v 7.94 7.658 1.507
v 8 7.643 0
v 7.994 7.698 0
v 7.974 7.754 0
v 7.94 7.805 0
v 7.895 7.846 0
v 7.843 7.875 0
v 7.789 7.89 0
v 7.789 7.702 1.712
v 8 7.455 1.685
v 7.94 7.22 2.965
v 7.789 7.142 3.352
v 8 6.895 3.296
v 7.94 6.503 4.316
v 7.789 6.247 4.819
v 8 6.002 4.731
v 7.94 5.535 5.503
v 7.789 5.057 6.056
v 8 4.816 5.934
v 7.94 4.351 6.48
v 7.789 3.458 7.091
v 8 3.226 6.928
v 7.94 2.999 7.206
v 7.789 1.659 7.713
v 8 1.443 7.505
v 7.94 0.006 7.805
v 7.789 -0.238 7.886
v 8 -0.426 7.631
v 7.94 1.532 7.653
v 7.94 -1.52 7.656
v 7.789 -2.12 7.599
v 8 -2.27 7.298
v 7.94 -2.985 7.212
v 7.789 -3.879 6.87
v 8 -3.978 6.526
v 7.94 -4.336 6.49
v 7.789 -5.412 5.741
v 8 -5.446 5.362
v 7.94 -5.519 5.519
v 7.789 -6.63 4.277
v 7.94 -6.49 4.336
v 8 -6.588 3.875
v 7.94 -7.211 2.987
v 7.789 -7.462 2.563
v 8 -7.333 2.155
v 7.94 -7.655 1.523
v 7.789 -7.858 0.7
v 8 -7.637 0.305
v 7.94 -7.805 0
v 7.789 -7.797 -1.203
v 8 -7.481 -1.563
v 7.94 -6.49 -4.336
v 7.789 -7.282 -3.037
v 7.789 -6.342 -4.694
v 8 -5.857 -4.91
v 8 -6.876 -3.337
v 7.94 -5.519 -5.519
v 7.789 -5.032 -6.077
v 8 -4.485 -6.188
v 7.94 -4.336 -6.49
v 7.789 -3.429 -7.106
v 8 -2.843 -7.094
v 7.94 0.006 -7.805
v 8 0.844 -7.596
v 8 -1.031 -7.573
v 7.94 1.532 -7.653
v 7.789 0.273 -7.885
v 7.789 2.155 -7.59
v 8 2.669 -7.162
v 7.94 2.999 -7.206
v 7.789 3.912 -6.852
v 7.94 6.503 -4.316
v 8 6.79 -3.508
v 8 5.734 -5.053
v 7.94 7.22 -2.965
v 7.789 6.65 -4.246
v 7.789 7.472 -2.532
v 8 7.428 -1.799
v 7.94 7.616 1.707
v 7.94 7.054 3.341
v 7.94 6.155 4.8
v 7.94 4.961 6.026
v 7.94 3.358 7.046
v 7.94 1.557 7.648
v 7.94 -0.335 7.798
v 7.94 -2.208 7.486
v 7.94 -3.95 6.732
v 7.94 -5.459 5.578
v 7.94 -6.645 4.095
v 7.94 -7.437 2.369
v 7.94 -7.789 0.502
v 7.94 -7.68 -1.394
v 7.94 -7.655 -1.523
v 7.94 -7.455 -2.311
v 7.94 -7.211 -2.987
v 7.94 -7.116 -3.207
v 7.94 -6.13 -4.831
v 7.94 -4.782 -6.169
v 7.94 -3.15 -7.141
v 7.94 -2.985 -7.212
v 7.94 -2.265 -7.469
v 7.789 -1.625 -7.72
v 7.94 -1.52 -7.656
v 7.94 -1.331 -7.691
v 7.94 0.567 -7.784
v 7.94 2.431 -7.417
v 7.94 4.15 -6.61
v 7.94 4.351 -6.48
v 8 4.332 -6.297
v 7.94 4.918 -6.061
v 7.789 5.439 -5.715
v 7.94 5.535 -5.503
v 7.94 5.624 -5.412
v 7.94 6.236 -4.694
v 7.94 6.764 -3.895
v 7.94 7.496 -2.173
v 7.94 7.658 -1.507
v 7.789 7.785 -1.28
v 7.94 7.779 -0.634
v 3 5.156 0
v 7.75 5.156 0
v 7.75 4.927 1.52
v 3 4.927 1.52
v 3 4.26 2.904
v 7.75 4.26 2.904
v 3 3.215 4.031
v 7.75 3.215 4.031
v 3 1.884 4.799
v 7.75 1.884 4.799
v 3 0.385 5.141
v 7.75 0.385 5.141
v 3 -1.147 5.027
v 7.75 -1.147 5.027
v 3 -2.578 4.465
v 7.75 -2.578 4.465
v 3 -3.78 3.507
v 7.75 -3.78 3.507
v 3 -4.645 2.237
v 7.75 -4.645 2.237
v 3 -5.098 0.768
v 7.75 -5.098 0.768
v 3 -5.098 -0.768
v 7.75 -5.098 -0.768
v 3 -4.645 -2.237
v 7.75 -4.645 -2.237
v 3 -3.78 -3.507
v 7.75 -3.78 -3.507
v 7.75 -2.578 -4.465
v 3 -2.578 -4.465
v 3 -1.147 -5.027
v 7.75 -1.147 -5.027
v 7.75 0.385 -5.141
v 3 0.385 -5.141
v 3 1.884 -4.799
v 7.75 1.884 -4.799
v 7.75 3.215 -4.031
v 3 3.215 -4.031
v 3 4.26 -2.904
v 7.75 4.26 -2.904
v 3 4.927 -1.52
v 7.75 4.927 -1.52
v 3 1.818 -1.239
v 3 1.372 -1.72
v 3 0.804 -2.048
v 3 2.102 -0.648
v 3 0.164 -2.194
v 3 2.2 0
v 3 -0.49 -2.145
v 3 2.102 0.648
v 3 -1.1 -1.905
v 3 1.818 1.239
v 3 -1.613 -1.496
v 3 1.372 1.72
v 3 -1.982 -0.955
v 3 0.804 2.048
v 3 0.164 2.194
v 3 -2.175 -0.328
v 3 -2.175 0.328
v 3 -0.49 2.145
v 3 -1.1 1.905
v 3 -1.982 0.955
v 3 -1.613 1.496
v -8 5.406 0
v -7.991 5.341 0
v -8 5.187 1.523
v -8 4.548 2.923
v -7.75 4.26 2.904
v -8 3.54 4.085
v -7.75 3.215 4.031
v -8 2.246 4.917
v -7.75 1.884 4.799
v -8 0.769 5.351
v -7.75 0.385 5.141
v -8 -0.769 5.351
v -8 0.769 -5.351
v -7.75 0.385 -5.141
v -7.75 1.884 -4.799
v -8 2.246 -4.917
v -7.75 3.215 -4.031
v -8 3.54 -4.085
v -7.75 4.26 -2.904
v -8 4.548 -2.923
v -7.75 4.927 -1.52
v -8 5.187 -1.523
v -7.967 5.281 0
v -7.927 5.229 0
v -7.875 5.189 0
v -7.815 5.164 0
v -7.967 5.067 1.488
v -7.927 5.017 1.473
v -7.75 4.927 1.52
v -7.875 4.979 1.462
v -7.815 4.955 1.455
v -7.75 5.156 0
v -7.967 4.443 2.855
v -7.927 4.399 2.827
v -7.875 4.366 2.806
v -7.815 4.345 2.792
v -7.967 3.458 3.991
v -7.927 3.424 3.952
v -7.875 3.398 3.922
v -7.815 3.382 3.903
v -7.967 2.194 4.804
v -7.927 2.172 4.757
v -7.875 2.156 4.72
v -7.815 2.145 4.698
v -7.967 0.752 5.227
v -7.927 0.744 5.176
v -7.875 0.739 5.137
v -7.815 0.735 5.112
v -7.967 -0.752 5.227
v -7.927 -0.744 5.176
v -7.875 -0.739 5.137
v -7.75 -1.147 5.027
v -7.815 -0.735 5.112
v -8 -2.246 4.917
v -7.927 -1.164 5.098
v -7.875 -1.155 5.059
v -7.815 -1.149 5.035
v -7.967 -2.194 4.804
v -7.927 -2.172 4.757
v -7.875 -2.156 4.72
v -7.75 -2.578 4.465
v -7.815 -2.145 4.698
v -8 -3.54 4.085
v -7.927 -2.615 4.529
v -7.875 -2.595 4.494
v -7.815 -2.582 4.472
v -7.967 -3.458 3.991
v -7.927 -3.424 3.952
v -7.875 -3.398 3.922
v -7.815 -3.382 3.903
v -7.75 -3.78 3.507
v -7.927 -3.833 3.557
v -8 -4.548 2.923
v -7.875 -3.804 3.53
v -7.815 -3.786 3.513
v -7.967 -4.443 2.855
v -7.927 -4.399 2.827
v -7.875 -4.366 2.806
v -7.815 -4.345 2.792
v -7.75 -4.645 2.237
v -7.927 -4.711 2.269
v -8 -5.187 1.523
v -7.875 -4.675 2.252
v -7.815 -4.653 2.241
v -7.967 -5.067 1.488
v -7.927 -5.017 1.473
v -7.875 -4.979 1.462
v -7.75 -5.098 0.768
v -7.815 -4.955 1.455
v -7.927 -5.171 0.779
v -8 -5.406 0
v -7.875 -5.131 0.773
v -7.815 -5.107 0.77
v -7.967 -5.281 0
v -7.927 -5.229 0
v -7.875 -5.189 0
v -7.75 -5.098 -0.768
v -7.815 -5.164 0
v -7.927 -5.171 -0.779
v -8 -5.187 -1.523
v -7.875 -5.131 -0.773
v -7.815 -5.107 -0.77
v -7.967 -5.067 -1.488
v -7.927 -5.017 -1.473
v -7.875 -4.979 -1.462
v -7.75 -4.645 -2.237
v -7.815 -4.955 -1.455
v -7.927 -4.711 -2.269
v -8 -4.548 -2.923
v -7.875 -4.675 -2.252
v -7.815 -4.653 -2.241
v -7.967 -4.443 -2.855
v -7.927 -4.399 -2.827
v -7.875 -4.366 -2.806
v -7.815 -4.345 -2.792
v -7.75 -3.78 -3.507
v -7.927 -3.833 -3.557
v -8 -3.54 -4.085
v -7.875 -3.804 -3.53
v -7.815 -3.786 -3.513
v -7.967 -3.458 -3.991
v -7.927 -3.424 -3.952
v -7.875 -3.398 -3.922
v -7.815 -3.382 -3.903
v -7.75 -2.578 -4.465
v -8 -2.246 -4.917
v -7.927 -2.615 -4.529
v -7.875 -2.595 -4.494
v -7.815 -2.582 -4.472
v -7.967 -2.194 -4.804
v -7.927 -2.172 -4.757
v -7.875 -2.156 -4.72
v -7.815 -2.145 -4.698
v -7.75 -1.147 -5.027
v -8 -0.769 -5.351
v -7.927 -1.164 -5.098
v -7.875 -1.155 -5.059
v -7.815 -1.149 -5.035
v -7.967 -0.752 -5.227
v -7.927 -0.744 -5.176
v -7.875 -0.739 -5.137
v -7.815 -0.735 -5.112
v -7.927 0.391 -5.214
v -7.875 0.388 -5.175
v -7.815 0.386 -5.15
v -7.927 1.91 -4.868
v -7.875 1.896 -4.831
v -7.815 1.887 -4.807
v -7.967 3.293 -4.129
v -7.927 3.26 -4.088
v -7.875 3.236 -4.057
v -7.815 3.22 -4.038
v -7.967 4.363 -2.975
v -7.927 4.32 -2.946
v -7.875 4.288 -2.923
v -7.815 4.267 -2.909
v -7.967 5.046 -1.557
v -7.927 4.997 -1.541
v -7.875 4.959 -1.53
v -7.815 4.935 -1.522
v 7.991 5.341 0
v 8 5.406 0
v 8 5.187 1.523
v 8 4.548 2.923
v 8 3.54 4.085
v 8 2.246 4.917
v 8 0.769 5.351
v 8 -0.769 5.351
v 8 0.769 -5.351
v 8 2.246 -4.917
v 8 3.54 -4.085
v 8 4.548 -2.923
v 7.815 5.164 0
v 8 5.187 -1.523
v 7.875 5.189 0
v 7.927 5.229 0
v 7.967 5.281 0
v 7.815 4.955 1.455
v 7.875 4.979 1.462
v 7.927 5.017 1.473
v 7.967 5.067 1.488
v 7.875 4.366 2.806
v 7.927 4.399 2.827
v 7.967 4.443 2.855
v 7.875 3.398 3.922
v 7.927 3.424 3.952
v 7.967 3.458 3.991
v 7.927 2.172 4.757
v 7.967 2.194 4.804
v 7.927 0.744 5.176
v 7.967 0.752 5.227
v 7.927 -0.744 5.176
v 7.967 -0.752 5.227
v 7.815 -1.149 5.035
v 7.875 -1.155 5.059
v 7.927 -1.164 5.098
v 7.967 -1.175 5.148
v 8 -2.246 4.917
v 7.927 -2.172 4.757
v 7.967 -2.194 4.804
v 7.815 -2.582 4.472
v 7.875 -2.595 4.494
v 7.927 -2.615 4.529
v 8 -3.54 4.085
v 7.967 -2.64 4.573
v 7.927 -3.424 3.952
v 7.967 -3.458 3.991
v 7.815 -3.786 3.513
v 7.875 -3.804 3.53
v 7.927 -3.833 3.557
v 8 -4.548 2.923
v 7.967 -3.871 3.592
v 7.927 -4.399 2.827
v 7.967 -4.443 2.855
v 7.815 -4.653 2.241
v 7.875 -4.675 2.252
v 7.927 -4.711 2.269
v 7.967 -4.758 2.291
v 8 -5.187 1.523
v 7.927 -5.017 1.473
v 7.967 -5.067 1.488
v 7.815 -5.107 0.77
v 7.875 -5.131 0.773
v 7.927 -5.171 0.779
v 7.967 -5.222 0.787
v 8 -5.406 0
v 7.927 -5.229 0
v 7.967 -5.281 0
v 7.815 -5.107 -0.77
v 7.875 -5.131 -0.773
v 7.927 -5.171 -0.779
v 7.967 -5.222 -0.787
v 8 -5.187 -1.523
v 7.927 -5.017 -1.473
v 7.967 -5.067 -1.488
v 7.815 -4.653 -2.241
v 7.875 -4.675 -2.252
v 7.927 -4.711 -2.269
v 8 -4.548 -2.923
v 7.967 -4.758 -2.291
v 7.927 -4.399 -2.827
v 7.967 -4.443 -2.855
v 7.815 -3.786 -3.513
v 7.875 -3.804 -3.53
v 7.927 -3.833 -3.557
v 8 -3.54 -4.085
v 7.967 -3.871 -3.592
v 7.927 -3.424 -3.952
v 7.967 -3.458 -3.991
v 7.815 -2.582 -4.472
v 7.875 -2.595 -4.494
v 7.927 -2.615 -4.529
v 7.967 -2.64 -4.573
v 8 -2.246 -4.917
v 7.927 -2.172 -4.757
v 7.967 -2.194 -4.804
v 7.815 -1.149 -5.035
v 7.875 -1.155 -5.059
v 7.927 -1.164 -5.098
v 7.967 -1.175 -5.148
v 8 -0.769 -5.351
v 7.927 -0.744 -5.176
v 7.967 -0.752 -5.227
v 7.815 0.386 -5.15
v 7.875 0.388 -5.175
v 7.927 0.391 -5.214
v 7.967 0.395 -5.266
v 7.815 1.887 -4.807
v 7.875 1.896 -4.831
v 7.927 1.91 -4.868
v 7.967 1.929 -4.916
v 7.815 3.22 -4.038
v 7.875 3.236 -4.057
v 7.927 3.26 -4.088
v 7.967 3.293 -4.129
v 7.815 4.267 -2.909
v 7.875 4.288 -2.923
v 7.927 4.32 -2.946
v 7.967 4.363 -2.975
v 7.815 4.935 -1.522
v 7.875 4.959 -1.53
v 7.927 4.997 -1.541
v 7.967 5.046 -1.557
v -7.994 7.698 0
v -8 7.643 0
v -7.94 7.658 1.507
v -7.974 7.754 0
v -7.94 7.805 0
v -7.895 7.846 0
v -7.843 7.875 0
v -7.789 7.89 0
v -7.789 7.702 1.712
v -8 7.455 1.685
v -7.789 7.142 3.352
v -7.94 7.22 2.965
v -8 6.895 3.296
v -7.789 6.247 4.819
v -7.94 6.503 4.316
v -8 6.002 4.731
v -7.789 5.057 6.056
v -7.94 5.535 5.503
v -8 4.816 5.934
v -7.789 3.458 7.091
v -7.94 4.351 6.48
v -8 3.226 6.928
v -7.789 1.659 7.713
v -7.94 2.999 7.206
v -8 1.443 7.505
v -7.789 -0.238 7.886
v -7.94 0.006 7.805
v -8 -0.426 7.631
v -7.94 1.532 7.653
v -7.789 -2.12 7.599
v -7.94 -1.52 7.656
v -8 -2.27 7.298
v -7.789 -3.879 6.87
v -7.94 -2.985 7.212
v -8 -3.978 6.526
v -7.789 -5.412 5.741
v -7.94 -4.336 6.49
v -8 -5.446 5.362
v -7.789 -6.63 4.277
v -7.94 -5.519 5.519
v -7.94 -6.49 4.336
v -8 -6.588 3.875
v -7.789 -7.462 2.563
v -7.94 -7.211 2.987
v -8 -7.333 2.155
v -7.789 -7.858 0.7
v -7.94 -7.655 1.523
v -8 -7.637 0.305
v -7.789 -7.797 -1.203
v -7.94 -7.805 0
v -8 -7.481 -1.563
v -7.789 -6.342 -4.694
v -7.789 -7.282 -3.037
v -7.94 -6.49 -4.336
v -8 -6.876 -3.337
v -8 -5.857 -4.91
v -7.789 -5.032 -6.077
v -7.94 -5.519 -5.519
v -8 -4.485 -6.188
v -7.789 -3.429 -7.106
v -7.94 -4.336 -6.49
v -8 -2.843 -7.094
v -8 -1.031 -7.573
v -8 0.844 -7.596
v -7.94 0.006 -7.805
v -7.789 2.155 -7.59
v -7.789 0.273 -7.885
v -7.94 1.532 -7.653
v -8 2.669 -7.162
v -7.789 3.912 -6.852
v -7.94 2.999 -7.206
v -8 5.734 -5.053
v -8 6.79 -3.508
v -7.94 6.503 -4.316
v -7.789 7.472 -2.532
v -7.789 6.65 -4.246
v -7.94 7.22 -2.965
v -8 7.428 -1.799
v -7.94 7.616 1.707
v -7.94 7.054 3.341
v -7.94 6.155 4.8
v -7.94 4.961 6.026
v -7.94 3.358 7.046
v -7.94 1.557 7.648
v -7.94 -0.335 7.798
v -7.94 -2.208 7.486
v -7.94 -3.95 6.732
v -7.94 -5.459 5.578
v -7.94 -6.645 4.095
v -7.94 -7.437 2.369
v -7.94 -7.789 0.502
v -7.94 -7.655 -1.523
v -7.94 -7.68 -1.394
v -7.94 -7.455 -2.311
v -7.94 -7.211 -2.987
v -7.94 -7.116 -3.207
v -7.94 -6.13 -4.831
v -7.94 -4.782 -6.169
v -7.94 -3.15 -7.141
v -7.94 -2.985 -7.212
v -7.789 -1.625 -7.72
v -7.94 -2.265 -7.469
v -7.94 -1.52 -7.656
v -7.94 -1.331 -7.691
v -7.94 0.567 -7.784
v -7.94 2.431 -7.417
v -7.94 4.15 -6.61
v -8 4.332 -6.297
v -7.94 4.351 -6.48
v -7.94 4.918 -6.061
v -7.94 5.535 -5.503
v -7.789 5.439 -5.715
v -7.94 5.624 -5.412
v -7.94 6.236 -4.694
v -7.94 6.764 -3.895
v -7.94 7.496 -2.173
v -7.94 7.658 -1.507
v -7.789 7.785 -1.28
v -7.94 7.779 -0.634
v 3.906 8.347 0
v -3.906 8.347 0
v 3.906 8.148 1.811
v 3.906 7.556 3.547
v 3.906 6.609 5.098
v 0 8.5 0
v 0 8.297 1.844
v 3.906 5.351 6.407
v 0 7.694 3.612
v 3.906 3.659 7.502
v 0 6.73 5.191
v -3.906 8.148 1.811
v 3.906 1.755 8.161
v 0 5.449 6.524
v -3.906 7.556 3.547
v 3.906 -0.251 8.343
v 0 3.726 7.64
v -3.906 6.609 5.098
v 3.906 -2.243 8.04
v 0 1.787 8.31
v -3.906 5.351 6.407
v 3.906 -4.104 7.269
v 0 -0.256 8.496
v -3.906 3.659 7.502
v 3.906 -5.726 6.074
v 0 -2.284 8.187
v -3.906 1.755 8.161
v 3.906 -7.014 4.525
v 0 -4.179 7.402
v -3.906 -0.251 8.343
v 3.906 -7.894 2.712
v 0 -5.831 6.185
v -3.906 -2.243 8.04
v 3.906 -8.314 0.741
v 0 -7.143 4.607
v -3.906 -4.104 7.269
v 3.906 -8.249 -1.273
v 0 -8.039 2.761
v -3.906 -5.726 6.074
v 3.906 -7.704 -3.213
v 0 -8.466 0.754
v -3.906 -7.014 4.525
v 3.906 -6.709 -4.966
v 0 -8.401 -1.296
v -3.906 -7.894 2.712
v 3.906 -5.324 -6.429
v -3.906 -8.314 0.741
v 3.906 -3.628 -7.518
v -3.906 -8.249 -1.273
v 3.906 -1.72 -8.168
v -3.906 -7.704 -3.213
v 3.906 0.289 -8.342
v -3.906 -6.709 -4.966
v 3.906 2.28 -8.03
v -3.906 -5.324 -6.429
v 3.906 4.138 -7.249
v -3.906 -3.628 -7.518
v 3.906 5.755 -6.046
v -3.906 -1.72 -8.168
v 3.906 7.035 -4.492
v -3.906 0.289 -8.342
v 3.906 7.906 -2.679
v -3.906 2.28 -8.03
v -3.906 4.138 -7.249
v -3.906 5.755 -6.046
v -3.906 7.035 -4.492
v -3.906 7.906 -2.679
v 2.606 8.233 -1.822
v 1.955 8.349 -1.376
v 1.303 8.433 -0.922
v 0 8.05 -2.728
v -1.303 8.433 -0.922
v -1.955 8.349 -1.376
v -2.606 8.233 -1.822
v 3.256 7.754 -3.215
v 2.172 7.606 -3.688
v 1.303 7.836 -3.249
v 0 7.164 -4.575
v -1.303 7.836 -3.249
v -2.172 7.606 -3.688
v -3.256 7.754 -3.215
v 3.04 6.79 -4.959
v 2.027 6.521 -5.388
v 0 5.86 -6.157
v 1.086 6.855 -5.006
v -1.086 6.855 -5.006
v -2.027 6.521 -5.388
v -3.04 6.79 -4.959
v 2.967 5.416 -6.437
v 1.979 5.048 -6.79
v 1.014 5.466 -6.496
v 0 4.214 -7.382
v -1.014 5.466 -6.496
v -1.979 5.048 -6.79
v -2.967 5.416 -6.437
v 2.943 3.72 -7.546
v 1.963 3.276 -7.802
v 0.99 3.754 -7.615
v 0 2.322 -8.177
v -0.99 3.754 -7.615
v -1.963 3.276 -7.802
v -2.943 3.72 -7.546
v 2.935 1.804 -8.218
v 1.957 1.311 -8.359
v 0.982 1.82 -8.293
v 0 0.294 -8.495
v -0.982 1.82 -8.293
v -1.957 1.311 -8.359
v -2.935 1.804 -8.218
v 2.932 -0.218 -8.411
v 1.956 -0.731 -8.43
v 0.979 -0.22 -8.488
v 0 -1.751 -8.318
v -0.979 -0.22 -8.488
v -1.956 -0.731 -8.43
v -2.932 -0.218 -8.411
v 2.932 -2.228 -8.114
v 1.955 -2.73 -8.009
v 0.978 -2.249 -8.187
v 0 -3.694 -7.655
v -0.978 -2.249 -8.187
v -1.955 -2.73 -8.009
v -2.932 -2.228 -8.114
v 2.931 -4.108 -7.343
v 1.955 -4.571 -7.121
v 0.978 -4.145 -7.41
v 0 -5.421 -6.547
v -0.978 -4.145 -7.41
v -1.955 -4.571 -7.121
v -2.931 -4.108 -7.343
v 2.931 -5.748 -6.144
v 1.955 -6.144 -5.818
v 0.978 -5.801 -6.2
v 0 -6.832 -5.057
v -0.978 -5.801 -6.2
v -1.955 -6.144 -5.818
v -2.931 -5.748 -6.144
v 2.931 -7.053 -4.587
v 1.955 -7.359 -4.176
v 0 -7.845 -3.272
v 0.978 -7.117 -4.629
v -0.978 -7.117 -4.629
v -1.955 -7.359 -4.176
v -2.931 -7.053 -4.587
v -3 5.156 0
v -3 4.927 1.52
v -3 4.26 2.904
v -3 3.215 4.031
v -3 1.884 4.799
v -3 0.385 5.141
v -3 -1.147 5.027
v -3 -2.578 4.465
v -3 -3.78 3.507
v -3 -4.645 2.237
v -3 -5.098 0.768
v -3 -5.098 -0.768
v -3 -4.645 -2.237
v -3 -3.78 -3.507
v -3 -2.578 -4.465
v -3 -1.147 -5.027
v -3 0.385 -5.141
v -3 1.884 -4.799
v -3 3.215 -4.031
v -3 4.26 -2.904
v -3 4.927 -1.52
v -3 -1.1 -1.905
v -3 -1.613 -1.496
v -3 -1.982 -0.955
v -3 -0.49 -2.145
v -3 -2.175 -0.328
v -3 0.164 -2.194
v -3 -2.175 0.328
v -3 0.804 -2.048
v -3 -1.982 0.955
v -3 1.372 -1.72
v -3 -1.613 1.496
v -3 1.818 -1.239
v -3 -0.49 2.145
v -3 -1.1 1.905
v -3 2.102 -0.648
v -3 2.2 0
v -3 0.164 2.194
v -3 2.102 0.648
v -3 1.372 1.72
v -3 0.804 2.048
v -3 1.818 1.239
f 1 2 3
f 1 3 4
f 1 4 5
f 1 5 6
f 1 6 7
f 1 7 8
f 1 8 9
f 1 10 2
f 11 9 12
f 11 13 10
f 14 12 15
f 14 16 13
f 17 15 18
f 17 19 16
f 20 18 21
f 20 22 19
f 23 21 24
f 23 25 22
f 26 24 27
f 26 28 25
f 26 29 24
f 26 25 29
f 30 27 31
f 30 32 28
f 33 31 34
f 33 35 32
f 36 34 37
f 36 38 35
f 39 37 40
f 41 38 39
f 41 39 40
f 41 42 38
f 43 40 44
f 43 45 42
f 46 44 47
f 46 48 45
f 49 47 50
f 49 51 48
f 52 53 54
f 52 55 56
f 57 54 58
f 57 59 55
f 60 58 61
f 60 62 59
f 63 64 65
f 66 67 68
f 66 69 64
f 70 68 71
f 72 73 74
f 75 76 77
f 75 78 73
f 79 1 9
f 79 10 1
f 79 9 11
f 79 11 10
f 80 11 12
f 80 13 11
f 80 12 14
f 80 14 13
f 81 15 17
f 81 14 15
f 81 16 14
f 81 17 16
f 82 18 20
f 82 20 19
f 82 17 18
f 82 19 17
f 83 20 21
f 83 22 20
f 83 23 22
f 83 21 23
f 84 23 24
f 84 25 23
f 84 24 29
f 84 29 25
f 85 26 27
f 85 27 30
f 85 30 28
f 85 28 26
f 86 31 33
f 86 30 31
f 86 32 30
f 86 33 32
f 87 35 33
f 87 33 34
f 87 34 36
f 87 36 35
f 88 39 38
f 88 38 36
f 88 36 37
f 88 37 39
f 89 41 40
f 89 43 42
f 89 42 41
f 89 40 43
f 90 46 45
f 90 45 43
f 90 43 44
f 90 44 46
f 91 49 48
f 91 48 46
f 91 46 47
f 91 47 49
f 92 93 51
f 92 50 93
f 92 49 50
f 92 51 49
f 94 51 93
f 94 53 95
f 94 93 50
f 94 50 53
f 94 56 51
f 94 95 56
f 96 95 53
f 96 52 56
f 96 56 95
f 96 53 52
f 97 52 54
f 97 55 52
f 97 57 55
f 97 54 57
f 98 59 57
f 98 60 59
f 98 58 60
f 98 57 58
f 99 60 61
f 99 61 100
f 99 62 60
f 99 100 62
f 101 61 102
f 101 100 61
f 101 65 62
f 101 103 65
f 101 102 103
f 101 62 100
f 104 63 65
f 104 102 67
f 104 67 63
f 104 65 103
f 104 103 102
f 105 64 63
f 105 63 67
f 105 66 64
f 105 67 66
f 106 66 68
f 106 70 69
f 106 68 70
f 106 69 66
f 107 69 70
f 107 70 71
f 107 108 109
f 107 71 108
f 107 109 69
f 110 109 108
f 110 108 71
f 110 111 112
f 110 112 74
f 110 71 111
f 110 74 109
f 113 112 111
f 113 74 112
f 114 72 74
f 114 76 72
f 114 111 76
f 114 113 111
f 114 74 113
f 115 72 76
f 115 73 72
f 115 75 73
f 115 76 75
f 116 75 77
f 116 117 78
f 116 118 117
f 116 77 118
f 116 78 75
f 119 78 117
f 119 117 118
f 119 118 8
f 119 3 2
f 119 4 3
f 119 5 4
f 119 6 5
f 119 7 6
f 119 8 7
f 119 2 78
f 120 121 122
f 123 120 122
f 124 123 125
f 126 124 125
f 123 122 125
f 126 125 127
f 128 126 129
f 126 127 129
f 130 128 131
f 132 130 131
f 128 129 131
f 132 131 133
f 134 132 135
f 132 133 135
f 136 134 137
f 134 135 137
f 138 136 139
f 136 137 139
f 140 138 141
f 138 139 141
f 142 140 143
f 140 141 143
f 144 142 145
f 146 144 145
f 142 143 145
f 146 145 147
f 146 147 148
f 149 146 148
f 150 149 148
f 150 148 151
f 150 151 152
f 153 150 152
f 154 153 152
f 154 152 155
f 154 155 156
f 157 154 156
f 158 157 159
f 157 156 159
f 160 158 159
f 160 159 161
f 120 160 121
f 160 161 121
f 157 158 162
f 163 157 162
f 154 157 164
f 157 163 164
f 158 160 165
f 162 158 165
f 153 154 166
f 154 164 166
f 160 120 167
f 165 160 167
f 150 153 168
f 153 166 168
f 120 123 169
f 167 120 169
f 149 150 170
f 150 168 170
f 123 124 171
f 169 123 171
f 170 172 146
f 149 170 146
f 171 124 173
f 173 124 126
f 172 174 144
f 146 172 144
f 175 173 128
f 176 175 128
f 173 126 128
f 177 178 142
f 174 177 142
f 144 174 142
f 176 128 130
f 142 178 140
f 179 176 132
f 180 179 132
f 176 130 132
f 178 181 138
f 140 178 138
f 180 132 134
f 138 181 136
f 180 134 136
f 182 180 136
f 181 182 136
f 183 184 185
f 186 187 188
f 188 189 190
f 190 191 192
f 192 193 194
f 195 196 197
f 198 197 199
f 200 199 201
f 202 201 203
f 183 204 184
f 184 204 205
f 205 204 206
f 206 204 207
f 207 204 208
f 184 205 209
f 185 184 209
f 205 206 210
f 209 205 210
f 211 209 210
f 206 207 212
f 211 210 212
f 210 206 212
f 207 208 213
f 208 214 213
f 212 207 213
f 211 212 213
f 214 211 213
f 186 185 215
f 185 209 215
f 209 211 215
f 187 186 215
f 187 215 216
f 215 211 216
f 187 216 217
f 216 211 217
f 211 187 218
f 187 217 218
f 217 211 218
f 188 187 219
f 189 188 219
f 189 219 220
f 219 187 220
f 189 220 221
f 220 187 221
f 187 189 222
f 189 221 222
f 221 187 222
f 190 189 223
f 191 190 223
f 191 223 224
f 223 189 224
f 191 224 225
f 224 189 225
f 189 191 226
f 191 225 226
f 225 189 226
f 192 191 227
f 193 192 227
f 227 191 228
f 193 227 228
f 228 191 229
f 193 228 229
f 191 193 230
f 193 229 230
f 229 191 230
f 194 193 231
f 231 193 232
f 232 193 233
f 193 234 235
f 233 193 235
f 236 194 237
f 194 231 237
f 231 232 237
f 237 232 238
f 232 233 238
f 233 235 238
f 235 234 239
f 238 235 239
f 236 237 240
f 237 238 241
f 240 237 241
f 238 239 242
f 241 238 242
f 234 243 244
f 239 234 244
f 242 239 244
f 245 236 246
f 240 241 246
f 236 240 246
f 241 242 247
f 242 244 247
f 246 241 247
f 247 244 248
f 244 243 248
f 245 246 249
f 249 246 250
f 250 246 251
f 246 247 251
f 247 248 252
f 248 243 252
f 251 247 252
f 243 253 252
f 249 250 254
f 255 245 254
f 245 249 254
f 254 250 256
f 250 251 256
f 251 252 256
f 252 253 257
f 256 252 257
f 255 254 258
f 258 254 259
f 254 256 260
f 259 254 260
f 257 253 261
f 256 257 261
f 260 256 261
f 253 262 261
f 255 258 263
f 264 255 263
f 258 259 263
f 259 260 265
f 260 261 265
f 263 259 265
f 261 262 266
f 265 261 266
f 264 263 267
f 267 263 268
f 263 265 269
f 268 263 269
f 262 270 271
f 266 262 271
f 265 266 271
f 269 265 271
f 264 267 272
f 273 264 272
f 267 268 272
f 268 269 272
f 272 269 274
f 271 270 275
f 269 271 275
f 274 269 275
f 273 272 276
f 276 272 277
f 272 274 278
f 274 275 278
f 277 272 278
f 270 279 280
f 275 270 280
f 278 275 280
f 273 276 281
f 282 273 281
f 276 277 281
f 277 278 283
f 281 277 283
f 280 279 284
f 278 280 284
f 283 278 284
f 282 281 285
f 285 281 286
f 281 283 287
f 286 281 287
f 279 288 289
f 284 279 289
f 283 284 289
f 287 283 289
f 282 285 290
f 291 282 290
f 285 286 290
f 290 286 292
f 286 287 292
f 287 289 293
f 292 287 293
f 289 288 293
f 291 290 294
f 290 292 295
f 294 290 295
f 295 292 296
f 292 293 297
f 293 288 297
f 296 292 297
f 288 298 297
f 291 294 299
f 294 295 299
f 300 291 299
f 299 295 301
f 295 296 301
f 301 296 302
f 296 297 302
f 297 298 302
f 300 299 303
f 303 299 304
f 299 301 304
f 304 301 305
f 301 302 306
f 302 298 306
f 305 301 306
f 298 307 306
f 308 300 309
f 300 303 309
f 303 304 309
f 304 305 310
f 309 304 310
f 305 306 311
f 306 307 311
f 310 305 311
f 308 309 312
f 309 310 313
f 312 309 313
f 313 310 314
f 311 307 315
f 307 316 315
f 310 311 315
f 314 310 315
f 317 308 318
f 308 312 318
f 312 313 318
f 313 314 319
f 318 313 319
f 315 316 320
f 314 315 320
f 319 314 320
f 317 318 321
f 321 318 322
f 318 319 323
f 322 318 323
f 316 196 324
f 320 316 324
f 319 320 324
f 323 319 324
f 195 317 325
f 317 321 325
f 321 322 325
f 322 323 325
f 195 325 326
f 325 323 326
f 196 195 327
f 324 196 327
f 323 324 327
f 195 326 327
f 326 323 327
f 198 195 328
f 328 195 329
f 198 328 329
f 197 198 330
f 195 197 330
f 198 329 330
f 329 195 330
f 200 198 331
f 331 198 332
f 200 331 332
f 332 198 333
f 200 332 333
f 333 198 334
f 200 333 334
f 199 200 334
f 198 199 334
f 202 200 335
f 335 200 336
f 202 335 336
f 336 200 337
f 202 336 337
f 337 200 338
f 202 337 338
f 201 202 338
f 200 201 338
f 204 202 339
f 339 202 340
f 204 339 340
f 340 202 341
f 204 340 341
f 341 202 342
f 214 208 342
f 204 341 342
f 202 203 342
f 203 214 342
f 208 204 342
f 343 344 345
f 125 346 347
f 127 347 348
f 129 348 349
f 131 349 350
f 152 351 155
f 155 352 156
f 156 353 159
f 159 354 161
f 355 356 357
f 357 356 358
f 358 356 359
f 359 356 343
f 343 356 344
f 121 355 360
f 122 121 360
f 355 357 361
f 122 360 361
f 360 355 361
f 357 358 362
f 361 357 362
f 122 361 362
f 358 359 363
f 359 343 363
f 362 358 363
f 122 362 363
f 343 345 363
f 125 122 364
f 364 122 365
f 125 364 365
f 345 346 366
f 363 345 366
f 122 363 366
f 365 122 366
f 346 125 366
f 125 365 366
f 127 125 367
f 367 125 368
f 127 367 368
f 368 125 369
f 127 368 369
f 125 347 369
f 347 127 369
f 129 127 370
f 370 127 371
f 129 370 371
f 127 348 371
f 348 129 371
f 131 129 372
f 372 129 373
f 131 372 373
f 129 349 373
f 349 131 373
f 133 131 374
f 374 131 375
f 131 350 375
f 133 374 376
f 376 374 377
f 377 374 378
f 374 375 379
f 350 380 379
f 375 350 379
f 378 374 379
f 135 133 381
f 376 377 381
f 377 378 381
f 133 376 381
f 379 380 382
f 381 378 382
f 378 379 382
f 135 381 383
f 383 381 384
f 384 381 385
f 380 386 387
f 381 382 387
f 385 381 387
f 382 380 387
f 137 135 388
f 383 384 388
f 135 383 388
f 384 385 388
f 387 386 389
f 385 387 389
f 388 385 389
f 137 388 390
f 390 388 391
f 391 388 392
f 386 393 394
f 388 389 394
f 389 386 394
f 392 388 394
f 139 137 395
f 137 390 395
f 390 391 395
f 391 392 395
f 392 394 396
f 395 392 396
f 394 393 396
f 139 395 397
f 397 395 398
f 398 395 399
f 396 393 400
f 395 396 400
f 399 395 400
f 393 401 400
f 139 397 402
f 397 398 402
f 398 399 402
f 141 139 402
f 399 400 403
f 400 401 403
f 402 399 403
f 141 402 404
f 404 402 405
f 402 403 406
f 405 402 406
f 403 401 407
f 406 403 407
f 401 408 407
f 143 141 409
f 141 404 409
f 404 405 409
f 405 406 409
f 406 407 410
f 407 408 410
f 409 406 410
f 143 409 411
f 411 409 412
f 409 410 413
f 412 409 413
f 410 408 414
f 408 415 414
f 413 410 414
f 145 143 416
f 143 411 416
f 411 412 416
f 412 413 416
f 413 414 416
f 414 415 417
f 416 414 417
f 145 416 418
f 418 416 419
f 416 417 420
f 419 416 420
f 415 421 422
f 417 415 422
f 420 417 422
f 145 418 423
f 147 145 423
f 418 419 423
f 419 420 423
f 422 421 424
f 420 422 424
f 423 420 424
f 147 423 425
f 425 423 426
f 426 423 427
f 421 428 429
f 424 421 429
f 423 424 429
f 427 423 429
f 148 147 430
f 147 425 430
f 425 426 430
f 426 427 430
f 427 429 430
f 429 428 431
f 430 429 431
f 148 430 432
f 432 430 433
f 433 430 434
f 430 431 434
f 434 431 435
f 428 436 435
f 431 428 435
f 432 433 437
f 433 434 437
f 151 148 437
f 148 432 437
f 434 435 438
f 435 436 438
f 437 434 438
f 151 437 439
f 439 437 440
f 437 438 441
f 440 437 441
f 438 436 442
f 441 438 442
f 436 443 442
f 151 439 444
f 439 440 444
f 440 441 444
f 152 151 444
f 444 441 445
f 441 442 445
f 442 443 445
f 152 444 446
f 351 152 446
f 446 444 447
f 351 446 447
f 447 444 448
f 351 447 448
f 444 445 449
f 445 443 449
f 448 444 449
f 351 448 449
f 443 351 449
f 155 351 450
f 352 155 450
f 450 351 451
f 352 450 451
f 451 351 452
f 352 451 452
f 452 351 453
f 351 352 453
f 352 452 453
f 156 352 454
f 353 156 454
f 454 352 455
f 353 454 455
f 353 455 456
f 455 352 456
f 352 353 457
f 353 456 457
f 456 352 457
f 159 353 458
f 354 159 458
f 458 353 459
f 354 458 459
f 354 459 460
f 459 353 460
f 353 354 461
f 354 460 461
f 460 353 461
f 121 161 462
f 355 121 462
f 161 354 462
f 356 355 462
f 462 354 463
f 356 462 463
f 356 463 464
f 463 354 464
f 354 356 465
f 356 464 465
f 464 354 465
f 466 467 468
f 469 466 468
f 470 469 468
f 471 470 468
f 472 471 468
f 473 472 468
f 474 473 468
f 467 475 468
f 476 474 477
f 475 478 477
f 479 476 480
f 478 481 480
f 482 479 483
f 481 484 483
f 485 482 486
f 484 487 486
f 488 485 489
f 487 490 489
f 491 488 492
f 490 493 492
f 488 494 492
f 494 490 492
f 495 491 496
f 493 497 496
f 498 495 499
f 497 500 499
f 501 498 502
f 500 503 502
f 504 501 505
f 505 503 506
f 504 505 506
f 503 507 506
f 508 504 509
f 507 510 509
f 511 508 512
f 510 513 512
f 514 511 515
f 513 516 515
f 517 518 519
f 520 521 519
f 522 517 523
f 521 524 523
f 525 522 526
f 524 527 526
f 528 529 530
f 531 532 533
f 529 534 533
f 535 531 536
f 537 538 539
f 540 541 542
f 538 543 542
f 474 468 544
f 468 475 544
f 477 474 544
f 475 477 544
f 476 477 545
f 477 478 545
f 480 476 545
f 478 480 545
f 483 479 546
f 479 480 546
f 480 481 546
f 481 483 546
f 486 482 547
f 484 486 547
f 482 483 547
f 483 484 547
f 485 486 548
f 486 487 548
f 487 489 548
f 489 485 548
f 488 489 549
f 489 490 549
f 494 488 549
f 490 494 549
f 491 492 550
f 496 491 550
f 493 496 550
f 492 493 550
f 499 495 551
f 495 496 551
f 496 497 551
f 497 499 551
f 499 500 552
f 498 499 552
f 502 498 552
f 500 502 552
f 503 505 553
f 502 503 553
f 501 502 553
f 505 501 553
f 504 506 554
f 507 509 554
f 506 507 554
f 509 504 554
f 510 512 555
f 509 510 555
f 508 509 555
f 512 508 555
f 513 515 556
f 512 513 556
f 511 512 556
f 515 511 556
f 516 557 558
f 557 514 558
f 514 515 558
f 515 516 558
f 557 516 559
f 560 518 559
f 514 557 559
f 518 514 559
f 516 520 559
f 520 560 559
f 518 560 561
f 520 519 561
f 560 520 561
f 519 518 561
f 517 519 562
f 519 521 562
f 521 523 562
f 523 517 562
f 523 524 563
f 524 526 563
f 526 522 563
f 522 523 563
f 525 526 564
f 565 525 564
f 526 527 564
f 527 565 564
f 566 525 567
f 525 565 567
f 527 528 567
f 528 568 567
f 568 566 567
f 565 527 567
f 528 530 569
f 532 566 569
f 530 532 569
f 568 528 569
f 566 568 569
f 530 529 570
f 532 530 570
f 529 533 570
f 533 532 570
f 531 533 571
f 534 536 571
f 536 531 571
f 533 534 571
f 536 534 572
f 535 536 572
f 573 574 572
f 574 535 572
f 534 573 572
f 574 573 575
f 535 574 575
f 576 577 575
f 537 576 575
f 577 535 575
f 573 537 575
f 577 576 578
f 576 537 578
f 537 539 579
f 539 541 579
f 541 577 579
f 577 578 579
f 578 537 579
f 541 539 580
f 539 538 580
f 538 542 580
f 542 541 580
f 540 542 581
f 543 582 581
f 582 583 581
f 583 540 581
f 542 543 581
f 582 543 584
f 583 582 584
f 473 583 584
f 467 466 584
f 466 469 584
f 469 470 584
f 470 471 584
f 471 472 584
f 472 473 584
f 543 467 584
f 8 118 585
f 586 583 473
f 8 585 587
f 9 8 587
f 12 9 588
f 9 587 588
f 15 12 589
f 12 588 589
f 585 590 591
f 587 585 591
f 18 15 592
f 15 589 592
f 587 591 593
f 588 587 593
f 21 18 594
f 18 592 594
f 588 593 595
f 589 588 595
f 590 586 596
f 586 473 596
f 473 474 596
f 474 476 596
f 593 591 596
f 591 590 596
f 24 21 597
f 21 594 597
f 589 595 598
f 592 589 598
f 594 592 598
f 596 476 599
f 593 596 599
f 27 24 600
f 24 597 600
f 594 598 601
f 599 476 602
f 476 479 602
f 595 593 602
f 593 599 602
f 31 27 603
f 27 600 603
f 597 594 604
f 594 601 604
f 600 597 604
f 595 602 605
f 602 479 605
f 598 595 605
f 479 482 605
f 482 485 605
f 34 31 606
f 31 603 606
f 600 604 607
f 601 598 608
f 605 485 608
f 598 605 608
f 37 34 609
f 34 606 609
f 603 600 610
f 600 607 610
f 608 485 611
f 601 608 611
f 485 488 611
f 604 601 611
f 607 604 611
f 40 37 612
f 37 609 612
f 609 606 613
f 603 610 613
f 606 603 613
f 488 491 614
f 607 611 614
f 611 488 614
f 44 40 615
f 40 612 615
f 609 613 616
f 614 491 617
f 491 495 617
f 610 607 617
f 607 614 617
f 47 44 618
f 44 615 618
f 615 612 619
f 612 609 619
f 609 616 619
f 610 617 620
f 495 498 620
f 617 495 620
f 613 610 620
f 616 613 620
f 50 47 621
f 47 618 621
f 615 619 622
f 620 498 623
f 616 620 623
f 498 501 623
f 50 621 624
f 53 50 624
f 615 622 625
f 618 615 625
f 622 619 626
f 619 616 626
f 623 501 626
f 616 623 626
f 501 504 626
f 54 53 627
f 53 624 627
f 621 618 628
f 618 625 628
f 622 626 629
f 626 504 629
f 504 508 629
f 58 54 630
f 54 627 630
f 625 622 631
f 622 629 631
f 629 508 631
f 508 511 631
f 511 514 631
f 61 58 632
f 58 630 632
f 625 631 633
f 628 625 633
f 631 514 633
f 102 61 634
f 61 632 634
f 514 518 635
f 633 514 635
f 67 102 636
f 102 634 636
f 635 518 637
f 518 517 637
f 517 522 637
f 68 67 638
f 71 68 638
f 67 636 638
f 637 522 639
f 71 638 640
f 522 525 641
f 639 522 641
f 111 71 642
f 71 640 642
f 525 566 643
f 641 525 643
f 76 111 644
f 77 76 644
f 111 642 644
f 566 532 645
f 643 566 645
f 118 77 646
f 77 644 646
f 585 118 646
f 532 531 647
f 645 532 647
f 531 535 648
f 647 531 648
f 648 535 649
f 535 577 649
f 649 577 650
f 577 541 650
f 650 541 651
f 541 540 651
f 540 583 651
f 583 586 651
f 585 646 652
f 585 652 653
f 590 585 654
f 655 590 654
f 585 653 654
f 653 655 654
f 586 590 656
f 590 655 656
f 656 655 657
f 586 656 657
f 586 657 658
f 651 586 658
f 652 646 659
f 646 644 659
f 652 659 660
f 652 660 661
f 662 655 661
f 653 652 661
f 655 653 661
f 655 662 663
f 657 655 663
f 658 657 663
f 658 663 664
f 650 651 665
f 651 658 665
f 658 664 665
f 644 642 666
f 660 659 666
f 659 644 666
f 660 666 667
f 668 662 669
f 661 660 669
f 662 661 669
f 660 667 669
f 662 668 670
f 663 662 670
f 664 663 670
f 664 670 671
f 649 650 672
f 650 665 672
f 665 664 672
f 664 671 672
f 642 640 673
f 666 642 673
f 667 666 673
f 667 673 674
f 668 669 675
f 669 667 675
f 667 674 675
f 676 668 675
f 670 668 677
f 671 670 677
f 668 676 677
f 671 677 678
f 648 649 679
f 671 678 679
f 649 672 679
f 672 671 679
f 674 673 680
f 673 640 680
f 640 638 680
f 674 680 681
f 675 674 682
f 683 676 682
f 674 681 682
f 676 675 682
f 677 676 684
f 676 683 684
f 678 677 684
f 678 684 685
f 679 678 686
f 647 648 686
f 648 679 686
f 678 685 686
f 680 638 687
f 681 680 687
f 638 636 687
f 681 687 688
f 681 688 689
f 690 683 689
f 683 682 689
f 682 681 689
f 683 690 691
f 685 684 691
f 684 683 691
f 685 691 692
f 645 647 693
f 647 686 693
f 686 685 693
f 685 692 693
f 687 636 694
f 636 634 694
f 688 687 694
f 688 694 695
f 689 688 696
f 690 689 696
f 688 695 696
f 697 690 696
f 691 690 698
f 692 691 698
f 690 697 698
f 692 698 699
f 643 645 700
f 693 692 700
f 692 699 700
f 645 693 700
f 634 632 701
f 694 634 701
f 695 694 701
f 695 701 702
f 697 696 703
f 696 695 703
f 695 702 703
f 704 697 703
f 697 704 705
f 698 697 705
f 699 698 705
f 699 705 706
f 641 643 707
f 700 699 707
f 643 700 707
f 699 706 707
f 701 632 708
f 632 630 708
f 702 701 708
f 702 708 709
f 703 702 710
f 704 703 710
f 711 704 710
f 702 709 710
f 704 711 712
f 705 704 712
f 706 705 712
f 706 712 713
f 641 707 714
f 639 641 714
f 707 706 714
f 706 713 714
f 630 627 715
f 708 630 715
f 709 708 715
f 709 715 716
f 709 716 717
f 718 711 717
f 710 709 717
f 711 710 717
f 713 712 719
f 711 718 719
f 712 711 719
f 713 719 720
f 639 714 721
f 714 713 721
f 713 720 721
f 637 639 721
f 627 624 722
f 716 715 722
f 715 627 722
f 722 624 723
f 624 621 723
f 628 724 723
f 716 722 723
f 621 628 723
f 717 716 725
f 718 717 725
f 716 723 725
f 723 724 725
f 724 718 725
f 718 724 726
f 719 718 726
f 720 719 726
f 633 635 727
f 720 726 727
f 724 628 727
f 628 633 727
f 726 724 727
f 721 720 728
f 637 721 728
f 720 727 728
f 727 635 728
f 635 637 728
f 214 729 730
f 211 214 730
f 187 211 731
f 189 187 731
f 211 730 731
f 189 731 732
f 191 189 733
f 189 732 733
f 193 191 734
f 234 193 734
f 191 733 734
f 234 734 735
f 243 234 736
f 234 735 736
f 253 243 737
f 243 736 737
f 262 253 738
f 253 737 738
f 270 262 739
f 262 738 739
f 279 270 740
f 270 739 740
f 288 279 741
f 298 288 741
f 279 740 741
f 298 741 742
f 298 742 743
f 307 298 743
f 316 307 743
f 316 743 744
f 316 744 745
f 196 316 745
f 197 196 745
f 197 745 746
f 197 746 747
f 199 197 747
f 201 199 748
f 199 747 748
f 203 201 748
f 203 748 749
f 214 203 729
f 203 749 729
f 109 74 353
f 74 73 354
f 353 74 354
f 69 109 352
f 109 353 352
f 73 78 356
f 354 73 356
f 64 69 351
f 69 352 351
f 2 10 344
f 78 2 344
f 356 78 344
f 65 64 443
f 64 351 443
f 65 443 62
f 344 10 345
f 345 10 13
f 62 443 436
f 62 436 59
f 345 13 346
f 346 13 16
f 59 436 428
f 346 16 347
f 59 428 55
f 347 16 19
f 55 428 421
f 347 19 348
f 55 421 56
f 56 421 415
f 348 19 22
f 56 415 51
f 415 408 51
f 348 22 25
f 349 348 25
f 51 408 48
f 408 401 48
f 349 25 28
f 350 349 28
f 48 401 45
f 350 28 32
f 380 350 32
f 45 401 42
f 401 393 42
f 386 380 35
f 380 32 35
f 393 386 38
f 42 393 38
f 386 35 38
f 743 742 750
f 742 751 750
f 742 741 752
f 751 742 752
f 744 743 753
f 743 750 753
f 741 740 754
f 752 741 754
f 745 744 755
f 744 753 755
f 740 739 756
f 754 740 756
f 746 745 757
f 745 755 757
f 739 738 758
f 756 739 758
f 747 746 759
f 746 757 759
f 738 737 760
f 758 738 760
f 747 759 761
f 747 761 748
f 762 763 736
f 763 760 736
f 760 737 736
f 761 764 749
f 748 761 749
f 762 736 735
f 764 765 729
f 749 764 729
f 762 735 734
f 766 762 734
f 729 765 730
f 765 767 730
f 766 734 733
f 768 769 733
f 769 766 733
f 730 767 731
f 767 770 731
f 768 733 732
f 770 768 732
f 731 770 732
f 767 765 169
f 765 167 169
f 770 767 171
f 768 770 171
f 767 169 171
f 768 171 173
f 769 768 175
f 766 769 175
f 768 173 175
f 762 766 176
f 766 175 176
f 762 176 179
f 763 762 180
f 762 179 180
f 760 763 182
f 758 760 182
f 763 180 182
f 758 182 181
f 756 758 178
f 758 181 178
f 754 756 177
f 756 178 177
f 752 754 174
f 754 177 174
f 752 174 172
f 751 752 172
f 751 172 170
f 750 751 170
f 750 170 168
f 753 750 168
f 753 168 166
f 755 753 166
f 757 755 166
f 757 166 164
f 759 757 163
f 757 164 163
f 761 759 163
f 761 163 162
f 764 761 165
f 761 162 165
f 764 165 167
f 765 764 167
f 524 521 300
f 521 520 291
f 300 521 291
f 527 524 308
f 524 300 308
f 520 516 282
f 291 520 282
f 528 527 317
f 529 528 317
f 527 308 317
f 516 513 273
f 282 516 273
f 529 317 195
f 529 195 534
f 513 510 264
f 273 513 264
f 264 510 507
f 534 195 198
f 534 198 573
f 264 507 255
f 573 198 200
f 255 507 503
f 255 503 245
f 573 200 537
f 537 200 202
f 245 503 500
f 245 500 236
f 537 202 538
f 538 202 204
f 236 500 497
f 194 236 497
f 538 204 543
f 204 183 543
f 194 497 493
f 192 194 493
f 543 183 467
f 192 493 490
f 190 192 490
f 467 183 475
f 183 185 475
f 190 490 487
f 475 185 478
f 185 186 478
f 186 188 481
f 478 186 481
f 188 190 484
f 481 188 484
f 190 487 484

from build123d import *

# Parameters (mm, degrees)
FILLET1_R = 0.25


with BuildPart() as part:
    # Sketch1 → Revolve1 (revolve)
    with BuildSketch(Plane.XY):
        with BuildLine():
            Line((-8, 7.855850717), (-8, 5.155850717))
            Line((-8, 5.155850717), (-3, 5.155850717))
            Line((-3, 5.155850717), (-3, 2.2))
            Line((-3, 2.2), (3, 2.2))
            Line((3, 2.2), (3, 5.155850717))
            Line((3, 5.155850717), (8, 5.155850717))
            Line((8, 5.155850717), (8, 7.855850717))
            ThreePointArc((8, 7.855850717), (0, 8.5), (-8, 7.855850717))
        make_face()
    revolve(axis=Axis((-9.77367688, 0, 0), (1, 0, 0)))

    # Fillet1
    fillet1_edges = [part.edges().sort_by_distance(p)[0] for p in [
        (8, -7.855850717, 0),
        (-8, -7.855850717, 0),
        (-8, -5.155850717, 0),
        (8, -5.155850717, 0),
    ]]
    fillet(fillet1_edges, radius=FILLET1_R)


solid = part.part
